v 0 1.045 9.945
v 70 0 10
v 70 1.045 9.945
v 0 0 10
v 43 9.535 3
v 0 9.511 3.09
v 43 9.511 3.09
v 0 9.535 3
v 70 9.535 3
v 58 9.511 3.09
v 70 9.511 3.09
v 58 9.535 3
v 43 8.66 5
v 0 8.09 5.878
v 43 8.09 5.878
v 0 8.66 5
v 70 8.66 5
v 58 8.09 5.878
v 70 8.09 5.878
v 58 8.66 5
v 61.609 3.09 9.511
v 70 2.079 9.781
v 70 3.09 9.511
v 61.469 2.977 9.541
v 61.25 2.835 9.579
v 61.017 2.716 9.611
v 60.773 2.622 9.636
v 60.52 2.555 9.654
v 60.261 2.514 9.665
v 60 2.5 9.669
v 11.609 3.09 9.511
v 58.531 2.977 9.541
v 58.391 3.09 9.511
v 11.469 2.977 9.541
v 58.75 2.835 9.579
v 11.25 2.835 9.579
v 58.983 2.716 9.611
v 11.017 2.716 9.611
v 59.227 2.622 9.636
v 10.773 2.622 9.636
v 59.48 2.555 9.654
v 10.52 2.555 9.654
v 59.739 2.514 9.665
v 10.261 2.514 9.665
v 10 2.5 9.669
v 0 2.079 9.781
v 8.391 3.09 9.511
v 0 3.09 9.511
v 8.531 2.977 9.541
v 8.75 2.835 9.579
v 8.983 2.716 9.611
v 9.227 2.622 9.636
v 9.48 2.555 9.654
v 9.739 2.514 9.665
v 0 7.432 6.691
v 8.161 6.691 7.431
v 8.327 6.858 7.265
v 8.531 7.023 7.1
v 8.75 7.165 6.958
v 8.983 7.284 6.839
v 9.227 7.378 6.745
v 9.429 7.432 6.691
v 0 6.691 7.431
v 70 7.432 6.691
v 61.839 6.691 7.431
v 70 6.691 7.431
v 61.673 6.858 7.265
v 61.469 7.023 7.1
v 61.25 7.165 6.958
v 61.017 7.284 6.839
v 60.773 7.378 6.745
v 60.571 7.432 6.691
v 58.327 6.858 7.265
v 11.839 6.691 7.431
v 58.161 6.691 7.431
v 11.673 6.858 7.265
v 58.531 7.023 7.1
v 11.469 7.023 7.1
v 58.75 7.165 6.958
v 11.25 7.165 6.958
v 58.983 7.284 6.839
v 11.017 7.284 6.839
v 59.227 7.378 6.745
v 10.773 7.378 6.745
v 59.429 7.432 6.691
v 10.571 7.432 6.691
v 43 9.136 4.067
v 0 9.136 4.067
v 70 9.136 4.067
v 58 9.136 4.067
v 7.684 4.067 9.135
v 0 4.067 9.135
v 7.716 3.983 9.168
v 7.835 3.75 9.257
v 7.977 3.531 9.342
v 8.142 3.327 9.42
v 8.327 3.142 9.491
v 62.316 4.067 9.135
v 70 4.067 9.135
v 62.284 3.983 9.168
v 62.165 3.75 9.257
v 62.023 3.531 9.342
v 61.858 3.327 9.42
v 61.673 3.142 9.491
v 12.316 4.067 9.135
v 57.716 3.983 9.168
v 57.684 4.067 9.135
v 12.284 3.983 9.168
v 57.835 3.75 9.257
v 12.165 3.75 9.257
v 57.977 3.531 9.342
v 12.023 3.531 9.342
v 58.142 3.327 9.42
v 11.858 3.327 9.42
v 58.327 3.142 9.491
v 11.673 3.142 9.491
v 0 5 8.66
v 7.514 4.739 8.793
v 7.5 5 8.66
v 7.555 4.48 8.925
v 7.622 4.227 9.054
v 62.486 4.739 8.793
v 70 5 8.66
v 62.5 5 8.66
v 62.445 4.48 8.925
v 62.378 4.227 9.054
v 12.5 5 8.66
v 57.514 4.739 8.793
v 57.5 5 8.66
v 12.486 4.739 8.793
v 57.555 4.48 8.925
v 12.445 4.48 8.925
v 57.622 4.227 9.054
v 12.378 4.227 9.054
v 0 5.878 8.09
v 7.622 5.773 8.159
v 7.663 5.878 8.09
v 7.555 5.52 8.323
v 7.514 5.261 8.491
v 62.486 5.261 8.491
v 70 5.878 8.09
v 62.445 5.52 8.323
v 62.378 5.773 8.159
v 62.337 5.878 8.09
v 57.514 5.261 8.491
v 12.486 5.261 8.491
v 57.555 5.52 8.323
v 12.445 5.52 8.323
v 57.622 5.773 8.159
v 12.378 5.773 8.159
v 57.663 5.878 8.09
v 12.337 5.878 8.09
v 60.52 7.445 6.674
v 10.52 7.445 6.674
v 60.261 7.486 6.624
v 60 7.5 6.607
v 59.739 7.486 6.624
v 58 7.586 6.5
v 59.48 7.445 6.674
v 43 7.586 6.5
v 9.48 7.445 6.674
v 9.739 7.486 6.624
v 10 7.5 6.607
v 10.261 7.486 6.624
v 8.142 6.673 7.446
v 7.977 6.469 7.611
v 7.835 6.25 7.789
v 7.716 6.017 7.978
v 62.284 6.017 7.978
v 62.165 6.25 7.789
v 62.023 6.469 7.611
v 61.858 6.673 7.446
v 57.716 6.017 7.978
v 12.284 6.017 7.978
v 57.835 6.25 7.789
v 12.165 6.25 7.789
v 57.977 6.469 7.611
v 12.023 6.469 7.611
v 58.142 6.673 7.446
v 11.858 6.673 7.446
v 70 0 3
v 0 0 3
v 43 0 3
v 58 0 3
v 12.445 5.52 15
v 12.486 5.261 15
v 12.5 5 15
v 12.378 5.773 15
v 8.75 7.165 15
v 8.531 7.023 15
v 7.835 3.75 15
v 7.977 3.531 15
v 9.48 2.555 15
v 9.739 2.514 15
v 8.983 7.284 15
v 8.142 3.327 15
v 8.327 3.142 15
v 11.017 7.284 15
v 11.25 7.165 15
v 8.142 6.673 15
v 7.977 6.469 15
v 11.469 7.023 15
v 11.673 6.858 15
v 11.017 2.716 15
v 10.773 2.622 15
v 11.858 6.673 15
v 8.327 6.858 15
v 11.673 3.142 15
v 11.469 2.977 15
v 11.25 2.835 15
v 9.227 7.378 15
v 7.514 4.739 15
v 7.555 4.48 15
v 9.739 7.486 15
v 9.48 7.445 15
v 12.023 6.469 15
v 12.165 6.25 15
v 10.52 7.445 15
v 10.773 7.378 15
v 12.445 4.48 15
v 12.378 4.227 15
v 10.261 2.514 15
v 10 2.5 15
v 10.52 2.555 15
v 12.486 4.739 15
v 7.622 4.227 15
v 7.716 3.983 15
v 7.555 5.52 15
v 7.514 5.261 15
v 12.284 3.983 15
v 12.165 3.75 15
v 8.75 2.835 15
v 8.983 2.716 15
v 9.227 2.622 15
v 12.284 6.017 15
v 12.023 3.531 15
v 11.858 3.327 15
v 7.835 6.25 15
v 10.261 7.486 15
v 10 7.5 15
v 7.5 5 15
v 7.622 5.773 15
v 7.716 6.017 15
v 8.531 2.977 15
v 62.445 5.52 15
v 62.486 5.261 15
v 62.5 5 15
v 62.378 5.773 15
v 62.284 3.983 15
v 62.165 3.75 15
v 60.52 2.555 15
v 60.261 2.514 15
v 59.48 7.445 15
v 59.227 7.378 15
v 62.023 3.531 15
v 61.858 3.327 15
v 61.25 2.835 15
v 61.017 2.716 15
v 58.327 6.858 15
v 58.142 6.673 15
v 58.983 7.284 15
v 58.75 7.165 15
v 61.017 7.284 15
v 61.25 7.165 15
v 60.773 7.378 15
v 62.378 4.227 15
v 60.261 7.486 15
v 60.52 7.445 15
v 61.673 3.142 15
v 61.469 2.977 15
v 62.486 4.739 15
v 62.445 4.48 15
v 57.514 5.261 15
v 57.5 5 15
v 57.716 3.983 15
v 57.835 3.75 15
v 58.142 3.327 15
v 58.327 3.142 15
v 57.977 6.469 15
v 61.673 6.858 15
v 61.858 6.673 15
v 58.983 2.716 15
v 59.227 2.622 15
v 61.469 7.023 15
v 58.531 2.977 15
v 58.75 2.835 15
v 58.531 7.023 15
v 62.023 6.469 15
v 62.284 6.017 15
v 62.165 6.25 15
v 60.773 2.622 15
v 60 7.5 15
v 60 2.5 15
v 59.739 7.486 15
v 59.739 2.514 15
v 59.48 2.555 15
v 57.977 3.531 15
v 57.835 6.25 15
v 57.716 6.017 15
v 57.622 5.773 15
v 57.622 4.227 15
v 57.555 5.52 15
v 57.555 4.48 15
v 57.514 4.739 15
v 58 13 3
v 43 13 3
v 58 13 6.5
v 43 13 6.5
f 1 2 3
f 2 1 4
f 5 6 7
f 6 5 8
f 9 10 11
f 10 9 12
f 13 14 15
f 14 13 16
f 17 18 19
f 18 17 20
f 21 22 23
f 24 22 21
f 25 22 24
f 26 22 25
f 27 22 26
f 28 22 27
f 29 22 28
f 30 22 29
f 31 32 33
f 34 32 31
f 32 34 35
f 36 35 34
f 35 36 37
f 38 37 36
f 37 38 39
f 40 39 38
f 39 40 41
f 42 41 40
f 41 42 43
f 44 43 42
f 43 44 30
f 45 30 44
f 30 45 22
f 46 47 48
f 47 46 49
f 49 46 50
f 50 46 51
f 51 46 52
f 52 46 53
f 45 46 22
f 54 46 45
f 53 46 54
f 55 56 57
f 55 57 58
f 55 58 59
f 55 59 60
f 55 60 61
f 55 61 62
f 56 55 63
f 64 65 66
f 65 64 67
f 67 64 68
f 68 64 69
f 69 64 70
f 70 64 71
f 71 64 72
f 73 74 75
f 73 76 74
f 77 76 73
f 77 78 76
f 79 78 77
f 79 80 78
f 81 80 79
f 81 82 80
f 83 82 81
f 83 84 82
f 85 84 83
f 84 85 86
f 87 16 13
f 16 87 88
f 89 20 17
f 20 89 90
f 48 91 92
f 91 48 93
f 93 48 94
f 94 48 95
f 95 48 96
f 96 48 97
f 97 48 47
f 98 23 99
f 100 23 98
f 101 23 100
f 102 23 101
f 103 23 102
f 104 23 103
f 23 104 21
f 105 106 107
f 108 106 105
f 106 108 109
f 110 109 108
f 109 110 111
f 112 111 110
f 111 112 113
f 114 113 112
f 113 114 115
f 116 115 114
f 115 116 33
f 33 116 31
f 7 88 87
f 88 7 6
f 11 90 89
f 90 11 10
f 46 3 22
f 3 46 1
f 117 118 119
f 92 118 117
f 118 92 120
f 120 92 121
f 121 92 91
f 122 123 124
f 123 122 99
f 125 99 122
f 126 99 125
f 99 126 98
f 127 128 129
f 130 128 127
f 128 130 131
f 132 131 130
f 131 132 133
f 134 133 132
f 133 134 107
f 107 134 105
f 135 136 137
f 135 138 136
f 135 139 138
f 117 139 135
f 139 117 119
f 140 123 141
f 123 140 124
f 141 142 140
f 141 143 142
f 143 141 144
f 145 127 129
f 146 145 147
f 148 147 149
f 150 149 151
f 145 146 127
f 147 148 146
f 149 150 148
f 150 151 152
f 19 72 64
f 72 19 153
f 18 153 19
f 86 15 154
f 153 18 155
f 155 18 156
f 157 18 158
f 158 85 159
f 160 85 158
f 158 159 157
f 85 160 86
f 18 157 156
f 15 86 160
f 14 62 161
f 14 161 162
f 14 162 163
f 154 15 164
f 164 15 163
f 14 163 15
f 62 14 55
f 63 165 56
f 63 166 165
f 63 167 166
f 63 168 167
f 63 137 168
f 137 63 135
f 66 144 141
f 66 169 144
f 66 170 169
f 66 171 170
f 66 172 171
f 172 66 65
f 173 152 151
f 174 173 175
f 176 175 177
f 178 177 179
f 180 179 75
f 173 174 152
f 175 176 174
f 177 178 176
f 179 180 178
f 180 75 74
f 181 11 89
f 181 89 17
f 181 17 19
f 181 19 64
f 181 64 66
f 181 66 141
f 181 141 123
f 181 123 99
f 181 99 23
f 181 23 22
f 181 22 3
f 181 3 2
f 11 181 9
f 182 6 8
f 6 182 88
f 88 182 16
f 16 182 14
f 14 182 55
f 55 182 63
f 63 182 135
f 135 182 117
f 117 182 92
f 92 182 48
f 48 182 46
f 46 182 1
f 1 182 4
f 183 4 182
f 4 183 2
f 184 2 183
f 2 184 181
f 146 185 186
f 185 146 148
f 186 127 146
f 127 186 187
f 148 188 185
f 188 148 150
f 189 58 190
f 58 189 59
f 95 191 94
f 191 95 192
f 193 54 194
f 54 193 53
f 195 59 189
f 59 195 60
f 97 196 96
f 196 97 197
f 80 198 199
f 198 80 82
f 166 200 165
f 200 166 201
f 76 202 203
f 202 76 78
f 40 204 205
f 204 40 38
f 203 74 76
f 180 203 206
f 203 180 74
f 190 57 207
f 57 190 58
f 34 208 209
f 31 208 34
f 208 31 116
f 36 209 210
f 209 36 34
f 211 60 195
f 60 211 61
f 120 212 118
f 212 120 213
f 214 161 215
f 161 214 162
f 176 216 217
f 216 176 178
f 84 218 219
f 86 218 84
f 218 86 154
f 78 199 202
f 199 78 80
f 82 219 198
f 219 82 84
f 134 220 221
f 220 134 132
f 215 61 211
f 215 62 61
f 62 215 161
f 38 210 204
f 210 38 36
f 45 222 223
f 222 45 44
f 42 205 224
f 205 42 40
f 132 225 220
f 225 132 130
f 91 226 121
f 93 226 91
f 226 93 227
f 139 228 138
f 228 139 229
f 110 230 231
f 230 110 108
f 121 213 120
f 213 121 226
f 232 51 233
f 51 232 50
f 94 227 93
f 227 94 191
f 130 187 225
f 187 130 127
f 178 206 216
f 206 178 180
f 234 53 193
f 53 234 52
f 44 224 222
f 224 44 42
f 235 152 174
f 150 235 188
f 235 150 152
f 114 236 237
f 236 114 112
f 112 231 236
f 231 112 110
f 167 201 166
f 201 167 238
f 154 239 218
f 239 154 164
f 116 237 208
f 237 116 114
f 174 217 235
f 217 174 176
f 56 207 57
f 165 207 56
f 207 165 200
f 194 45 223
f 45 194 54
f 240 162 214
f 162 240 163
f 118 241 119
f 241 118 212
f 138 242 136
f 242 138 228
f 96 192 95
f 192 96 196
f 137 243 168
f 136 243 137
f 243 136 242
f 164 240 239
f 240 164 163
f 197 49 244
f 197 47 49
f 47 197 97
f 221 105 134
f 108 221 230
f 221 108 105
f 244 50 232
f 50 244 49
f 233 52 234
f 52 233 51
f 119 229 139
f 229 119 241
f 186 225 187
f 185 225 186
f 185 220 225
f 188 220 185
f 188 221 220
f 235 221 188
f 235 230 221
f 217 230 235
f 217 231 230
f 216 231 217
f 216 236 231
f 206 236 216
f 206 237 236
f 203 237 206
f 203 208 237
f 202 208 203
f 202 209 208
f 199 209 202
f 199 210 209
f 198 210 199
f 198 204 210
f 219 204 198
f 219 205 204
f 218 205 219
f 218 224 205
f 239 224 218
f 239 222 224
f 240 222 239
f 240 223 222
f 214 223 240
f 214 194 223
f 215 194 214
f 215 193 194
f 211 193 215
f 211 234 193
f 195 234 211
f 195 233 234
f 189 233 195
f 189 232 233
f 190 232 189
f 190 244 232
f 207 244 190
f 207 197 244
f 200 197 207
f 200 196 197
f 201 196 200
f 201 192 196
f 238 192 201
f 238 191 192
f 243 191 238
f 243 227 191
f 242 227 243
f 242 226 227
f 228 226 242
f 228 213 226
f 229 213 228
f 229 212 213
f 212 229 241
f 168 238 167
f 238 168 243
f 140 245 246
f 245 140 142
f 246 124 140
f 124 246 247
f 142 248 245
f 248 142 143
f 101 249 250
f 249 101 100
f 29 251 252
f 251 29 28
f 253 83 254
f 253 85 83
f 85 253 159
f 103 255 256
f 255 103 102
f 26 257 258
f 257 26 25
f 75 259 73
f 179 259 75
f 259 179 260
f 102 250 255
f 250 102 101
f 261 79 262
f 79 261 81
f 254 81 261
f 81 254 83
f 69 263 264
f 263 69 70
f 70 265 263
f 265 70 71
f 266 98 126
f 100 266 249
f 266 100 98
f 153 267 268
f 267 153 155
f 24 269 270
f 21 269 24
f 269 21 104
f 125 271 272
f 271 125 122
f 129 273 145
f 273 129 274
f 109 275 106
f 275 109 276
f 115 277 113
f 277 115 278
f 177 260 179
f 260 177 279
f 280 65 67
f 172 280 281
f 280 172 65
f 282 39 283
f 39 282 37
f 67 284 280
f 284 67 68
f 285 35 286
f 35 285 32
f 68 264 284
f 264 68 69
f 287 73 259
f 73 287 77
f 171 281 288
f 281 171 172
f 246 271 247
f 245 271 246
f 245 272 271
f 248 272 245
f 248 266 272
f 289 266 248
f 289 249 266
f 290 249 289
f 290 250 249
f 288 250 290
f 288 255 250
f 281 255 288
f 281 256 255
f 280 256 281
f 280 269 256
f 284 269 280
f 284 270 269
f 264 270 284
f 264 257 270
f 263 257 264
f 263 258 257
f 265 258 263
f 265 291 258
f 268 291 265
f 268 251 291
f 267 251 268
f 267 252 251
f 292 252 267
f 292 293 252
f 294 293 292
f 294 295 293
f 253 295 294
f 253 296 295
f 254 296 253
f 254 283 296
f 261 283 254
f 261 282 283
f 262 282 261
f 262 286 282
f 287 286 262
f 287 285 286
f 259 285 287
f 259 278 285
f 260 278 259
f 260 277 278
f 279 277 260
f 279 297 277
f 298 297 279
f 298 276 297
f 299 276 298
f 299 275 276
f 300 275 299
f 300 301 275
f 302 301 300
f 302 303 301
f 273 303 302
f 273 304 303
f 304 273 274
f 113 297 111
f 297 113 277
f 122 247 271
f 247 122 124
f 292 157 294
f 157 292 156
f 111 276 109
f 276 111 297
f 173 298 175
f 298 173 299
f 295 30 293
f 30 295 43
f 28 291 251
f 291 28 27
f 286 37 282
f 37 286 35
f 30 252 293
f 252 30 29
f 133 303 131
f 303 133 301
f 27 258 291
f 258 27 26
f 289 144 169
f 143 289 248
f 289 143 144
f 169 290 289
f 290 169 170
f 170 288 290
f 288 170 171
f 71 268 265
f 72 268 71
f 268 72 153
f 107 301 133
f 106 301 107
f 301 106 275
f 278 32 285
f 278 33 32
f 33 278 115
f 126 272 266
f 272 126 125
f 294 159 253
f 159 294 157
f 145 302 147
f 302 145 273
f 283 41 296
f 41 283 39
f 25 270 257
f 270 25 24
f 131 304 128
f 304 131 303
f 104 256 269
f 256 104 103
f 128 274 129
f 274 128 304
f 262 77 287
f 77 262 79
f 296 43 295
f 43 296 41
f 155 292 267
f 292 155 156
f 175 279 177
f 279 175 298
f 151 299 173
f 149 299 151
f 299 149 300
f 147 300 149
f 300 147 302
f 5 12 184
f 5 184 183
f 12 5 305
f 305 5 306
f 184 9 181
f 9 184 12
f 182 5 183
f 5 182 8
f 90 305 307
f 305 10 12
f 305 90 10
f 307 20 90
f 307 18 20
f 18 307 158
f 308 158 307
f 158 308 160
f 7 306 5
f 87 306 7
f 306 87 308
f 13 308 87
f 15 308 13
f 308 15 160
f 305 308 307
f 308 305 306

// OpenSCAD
$fn = 60;

fill_size = [70, 10, 10];

module fillet(length=10, r=2) {
    difference() {
        cube([length, r, r]);

        translate([0, r, r])
        rotate([0, 90, 0])
            translate([0, 0, -1])
            cylinder(r=r, h=length+2);
    }
}

module pins() {
    translate([(fill_size[0]-55)/2+2.5, (fill_size[1]-5)/2+2.5, 0]) {
        cylinder(r=2.5, h=fill_size[1]+5);
        translate([50, 0, 0])
            cylinder(r=2.5, h=fill_size[1]+5);
        }
}

difference() {
    union () {
        difference() {
            cube(fill_size);
            
            translate([-1, fill_size[1]+.0001, fill_size[1]])
            rotate([180, 0, 0])
            fillet(length=fill_size[0]+2, r=fill_size[1]);
        }

        pins();
    }
    
    translate([-1, -1, -1])
        cube([fill_size[0]+2, fill_size[1]+2, 4]);
}

translate([fill_size[0]-27, 0, 3])
cube([15, 13, 3.5]);
